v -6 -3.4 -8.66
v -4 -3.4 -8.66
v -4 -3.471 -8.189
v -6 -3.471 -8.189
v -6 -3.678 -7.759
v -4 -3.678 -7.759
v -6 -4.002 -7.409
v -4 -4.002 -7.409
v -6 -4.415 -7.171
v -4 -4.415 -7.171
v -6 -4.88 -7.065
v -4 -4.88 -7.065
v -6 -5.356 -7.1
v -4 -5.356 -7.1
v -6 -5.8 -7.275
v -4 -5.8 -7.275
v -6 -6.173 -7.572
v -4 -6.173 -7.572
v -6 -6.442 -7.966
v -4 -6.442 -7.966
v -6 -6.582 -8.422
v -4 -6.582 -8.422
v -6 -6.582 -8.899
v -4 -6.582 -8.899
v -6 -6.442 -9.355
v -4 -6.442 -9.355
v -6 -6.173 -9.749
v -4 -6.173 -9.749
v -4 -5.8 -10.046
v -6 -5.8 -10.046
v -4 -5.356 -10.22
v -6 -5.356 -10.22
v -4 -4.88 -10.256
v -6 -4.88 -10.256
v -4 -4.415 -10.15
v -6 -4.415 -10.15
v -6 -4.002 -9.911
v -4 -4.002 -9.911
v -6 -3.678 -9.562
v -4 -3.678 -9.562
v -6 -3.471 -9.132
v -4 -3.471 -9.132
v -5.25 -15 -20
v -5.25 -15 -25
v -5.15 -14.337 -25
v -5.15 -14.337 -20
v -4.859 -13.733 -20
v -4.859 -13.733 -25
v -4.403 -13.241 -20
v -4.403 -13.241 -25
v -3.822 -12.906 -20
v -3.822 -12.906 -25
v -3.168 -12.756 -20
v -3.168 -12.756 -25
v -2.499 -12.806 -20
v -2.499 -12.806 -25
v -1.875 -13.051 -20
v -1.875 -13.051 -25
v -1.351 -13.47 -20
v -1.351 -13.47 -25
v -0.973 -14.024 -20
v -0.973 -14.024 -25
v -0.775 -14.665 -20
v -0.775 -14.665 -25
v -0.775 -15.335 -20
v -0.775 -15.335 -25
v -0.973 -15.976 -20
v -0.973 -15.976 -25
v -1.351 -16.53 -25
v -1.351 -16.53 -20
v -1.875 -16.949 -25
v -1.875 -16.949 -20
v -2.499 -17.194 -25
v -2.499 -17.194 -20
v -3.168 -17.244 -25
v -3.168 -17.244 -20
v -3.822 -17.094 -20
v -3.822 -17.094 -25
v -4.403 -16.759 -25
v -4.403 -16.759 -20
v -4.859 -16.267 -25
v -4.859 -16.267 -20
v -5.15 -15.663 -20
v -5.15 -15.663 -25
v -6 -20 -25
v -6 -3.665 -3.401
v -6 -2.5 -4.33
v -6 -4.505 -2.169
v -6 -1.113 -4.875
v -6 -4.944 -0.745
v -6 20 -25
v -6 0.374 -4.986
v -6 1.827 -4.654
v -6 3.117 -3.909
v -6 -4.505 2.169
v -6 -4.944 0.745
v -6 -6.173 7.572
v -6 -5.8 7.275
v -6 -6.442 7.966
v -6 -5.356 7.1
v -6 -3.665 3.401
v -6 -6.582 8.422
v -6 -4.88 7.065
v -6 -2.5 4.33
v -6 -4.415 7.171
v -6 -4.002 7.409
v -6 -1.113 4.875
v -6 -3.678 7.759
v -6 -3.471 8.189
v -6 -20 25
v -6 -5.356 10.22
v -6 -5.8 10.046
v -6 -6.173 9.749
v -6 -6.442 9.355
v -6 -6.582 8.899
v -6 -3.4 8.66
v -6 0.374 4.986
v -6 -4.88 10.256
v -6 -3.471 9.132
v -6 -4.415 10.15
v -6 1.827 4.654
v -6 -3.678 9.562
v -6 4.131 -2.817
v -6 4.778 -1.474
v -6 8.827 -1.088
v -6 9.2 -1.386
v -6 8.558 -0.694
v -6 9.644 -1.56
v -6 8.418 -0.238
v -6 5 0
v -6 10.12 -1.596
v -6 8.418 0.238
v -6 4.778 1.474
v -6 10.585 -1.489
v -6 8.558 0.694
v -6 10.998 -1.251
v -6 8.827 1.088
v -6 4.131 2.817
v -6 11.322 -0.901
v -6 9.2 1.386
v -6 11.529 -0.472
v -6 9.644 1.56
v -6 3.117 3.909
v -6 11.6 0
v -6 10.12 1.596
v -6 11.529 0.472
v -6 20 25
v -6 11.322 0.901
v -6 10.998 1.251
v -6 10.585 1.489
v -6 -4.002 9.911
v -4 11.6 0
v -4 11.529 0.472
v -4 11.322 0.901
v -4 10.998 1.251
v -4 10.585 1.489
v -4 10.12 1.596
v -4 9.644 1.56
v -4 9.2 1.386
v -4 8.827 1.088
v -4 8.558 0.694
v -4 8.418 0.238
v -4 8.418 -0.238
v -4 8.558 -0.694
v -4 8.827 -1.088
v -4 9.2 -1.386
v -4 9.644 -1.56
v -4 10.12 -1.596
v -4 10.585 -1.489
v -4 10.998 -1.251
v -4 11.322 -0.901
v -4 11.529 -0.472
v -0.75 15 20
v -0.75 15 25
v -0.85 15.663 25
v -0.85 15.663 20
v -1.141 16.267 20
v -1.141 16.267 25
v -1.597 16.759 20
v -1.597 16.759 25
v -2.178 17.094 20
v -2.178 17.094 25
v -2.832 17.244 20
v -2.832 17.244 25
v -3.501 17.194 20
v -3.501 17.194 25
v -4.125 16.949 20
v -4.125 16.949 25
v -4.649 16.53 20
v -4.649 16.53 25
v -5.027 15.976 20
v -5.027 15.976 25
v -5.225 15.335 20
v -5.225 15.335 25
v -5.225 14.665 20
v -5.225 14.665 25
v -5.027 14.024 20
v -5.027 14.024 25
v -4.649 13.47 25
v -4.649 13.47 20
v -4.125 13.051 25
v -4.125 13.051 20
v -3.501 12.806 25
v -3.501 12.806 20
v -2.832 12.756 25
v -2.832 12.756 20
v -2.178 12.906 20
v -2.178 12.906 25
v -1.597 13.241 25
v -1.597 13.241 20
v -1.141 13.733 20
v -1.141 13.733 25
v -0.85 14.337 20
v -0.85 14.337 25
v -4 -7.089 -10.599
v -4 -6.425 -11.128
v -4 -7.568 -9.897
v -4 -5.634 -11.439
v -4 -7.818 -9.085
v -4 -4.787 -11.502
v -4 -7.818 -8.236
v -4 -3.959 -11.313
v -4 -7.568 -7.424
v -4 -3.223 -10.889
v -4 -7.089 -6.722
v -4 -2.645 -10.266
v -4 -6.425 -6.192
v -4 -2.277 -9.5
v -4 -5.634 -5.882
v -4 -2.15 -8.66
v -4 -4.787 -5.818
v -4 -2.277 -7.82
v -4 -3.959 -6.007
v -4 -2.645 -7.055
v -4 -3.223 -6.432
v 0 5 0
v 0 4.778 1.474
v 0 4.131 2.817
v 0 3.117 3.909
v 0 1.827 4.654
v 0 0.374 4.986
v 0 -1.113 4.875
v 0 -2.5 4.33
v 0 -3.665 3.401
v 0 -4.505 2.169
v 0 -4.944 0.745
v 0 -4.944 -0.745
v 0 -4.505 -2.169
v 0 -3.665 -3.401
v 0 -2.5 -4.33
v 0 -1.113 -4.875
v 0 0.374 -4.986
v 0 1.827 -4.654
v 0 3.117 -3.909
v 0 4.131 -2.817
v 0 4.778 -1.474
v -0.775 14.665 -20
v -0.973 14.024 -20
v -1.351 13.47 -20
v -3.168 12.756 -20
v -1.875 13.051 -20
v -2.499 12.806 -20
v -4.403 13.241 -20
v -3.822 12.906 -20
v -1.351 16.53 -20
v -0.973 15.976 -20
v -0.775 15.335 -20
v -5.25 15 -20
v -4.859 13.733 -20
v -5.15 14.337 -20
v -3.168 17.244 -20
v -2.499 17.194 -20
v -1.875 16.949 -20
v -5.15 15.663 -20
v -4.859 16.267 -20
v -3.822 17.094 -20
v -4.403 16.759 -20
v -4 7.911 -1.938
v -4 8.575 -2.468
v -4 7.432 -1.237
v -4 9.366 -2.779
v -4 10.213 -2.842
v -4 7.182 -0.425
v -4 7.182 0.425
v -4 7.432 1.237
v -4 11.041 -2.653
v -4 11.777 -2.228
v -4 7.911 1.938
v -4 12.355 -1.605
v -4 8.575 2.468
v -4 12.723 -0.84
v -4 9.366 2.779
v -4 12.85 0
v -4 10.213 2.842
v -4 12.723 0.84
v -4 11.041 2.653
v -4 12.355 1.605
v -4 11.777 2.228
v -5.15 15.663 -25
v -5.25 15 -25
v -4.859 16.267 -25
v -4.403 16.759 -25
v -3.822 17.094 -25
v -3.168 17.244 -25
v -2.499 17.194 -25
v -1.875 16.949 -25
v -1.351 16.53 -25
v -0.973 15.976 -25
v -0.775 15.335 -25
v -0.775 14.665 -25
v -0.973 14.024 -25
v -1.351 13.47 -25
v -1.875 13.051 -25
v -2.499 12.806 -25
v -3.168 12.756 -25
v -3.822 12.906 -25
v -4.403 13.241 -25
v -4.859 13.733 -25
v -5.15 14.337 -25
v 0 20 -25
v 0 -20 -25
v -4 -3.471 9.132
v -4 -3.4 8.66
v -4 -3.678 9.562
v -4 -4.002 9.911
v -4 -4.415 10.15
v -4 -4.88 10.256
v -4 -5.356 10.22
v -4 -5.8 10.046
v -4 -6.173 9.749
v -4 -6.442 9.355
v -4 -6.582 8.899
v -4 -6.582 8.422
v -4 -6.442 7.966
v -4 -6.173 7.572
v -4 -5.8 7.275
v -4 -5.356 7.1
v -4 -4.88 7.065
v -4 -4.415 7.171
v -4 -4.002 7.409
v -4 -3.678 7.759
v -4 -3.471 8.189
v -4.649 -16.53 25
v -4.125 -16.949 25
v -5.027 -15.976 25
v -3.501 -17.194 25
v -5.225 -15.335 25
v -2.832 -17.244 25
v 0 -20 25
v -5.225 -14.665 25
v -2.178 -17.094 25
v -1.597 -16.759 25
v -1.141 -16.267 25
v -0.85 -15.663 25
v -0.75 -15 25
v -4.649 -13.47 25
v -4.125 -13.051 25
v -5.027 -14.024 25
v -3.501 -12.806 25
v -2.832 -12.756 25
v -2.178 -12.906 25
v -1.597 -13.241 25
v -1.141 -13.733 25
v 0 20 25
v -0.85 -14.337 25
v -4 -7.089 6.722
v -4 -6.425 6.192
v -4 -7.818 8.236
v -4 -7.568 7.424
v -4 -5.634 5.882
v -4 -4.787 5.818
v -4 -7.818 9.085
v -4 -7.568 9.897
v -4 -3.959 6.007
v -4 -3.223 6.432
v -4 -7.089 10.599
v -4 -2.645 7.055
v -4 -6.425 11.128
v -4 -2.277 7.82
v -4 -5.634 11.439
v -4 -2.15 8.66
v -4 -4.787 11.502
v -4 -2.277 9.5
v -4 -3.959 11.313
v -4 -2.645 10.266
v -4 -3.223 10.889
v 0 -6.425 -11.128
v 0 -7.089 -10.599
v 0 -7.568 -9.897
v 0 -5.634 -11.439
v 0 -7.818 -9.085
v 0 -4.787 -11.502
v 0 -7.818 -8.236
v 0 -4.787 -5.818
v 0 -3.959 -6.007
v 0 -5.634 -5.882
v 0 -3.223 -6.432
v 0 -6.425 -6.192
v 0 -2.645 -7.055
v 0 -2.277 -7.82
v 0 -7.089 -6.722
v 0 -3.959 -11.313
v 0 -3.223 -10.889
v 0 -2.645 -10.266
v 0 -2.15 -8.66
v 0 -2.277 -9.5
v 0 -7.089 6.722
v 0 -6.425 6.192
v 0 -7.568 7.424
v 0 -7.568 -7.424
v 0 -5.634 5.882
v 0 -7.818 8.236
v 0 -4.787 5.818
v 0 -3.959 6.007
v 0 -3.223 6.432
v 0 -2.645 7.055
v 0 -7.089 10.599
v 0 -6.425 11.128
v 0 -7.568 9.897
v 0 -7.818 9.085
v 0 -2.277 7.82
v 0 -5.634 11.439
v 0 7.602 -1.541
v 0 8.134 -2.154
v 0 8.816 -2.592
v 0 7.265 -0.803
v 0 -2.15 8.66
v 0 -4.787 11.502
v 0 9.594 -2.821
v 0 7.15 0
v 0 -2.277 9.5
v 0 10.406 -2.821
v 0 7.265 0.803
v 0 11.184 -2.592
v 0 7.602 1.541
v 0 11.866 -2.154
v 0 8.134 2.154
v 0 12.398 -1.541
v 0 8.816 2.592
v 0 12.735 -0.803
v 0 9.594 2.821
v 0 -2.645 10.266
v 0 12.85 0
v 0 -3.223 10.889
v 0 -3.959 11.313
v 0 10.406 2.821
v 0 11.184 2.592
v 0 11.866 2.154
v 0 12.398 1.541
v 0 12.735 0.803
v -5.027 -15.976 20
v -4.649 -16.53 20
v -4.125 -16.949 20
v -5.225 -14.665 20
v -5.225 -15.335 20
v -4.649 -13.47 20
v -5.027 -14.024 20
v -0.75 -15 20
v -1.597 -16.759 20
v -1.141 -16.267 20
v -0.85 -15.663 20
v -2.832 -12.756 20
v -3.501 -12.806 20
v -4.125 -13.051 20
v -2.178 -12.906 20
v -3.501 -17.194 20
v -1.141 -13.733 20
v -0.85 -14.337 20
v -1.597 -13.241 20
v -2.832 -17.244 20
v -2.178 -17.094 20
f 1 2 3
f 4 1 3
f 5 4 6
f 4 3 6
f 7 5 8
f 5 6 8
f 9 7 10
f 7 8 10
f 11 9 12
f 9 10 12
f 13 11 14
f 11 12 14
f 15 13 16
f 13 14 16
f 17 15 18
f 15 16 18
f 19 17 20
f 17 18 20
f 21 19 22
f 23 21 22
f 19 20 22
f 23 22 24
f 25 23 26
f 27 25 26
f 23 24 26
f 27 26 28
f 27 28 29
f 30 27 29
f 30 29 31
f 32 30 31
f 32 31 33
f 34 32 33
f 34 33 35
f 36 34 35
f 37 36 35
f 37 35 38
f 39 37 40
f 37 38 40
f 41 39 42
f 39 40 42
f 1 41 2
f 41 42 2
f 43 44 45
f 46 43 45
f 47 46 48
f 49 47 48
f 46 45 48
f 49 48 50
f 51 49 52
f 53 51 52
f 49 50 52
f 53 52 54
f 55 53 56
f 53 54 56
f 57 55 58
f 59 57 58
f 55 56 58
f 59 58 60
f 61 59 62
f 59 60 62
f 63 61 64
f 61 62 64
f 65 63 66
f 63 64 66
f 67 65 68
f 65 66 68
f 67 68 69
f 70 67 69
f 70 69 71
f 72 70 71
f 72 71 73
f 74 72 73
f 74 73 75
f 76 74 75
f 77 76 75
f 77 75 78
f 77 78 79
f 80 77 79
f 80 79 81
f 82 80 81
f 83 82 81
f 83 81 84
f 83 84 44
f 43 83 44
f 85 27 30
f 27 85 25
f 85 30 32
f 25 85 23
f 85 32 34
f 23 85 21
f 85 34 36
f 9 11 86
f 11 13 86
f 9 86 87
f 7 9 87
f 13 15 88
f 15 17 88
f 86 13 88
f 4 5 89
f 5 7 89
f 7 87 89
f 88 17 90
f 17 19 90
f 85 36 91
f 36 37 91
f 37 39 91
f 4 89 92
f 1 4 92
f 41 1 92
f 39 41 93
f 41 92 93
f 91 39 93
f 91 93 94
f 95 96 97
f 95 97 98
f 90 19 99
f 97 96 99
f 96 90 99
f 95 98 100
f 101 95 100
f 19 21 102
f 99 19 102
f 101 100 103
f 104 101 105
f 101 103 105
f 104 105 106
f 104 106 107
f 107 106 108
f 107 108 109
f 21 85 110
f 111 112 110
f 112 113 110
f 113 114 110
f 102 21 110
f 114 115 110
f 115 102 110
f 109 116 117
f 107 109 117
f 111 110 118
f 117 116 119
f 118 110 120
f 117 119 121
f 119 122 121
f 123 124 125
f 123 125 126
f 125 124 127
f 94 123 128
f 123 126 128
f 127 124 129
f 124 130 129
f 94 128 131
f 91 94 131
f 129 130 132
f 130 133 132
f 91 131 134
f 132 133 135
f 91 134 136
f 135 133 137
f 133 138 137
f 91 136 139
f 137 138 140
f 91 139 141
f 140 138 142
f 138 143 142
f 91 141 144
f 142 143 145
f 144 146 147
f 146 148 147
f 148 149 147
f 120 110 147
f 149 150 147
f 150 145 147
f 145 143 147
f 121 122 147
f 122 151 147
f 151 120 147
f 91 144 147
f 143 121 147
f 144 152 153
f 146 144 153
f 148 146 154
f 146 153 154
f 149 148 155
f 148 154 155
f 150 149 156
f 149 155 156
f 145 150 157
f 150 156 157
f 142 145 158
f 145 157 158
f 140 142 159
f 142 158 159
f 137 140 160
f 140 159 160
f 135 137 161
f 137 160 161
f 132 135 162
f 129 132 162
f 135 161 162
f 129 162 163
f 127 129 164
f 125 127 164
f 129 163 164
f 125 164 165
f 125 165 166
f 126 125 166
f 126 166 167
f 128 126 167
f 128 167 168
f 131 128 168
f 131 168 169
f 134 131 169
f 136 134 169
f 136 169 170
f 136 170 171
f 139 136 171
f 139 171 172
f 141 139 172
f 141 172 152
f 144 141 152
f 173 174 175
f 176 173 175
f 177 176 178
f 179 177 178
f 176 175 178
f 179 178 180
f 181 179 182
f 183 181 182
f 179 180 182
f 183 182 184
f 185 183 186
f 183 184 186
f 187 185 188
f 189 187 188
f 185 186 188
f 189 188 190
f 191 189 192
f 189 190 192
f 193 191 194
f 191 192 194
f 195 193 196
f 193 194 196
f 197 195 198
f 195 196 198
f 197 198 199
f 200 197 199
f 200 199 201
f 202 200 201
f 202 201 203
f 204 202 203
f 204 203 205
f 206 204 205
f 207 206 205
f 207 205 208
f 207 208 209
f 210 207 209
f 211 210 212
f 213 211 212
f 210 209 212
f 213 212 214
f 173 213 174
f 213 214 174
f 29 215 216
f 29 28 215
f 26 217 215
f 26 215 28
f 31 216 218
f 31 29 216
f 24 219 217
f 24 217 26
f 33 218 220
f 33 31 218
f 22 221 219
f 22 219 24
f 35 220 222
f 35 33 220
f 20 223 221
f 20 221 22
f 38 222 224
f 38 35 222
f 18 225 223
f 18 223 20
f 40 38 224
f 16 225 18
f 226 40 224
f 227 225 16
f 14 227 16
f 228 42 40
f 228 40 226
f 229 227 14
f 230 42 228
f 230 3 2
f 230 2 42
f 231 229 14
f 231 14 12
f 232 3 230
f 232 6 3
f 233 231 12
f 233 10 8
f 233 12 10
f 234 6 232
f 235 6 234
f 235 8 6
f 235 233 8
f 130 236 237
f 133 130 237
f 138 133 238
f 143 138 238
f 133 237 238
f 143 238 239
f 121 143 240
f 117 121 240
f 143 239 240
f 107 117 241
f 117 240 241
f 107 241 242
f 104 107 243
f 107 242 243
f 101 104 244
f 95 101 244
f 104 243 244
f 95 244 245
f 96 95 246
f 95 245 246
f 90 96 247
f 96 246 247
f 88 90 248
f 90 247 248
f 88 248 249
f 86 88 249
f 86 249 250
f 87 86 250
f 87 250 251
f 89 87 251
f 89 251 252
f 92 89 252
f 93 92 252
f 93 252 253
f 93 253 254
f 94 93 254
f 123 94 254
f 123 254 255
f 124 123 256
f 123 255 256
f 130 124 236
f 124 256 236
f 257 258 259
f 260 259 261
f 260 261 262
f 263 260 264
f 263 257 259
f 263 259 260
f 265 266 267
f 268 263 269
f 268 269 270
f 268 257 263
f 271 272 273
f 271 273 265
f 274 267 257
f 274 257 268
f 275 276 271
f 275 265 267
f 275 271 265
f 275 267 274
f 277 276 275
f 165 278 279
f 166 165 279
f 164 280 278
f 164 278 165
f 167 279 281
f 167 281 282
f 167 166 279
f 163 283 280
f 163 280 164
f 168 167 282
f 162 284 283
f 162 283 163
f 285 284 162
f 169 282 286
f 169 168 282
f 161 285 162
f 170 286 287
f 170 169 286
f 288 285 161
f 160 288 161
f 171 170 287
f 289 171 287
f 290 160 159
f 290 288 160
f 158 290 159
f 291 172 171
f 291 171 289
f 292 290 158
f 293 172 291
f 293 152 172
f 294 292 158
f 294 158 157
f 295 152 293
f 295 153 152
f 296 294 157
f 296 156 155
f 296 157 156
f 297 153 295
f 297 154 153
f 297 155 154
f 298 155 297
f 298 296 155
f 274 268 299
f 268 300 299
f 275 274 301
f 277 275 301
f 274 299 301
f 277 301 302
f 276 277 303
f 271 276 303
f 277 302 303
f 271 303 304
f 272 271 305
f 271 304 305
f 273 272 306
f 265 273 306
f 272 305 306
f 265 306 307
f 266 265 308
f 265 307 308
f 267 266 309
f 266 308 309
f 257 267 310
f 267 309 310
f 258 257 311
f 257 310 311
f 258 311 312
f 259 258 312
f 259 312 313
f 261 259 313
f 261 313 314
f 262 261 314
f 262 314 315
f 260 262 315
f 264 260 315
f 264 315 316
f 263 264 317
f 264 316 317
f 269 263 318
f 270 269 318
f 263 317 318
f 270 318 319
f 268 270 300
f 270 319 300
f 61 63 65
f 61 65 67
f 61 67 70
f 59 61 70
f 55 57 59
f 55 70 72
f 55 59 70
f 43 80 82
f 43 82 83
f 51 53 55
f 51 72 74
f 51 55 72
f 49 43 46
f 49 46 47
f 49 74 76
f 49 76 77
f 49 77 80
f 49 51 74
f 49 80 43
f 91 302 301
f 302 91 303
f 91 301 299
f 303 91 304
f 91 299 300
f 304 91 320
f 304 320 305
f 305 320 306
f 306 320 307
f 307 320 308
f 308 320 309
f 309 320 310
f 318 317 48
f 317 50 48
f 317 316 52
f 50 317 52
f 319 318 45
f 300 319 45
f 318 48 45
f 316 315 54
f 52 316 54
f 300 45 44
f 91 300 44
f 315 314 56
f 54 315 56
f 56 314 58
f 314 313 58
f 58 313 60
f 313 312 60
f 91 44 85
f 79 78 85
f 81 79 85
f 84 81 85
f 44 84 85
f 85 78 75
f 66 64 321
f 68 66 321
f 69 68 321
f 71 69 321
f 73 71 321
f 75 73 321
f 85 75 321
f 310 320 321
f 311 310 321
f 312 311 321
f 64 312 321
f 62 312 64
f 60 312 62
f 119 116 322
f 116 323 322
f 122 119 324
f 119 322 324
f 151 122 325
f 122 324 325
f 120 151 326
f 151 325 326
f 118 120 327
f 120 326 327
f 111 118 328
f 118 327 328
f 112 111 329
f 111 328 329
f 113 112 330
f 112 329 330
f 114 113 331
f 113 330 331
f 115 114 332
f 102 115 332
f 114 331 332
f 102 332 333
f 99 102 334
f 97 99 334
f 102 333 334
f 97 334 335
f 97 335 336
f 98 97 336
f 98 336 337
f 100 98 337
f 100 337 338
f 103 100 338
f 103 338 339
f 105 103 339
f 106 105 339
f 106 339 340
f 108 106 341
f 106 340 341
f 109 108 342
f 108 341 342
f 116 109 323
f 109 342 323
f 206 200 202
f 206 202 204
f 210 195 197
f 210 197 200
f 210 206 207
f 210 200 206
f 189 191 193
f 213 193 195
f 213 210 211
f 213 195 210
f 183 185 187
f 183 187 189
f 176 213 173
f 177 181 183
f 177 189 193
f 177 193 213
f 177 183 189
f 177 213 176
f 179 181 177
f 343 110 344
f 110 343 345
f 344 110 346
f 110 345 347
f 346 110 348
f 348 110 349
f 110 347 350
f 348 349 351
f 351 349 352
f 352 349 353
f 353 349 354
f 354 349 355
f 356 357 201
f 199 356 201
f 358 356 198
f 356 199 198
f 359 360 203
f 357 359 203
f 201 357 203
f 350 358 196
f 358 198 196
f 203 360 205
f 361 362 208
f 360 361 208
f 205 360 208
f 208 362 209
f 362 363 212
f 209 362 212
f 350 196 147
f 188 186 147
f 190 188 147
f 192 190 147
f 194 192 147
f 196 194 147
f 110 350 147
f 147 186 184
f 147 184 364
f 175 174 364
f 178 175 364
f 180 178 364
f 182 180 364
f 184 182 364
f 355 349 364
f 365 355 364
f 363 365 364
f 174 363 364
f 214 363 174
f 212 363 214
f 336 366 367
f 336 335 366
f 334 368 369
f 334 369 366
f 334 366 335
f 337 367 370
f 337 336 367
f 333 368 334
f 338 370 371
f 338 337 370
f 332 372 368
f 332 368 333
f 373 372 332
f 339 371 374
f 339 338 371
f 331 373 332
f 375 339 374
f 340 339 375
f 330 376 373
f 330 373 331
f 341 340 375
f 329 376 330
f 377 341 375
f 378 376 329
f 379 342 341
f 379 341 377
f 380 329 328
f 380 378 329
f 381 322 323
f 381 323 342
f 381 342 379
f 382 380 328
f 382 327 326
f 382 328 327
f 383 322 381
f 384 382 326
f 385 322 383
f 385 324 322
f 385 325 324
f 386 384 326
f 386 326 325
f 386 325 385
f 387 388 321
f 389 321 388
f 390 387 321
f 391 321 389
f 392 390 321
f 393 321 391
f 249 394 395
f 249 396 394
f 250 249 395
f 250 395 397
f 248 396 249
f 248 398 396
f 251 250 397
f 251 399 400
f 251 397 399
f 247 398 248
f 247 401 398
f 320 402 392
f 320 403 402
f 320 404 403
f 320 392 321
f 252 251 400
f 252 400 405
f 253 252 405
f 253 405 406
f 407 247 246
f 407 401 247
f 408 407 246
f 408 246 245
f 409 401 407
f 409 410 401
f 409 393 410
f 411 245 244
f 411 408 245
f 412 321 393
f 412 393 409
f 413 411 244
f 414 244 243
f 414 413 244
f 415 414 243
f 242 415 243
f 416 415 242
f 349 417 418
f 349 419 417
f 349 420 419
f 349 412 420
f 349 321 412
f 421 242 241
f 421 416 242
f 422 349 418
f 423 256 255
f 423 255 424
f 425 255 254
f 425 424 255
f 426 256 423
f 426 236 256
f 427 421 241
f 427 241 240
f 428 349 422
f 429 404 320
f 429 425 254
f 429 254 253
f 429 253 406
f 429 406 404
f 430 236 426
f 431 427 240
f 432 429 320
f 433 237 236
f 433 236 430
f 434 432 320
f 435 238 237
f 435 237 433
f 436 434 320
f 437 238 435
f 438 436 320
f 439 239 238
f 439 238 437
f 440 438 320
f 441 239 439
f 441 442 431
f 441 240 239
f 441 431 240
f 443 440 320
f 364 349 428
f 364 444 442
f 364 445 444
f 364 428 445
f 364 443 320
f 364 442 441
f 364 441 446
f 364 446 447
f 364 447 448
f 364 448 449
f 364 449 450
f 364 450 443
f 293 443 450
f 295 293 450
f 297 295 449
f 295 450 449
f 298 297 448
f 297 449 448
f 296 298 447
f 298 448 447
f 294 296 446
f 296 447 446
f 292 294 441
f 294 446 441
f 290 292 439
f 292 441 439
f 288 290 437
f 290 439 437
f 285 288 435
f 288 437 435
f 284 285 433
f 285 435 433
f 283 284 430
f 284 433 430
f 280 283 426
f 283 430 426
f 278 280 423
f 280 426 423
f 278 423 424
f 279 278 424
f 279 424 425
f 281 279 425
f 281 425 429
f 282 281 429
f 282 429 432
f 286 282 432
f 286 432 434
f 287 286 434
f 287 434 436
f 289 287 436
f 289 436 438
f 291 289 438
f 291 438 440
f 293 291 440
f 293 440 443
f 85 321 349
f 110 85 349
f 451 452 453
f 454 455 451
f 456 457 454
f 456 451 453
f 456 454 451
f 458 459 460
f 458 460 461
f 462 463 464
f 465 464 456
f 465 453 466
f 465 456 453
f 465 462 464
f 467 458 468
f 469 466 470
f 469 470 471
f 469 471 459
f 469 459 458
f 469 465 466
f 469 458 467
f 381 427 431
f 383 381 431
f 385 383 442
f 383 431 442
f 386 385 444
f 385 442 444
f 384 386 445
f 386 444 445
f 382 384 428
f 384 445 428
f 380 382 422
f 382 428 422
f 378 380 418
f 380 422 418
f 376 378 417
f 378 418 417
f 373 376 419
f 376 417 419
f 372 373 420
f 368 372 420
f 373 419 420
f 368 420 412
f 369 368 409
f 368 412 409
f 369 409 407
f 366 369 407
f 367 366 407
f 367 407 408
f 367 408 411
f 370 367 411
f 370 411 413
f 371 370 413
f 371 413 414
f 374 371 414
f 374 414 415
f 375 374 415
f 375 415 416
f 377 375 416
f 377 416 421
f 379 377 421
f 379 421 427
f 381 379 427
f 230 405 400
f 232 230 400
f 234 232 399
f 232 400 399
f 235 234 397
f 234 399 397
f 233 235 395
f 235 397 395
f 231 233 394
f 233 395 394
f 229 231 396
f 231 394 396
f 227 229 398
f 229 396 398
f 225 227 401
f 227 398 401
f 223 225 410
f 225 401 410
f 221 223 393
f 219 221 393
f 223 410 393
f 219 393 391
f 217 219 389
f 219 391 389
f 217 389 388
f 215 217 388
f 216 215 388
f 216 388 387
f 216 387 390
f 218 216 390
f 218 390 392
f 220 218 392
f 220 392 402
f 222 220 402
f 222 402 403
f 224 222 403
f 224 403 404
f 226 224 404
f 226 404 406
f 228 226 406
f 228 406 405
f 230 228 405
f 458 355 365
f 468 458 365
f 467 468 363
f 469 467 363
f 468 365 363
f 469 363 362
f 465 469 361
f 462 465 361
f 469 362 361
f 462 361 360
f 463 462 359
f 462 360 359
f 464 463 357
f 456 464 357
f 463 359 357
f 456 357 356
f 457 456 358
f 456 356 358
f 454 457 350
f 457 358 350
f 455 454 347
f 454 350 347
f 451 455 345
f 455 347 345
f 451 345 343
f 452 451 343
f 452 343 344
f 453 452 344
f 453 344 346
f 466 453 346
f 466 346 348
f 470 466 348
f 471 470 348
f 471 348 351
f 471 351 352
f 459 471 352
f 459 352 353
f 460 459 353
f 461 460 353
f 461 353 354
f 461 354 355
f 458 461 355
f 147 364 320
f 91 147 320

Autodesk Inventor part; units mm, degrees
ref_plane "YZ Plane" through (0, 0, 0) normal (1, 0, 0) x (0, 1, 0)
ref_plane "XZ Plane" through (0, 0, 0) normal (0, 1, 0) x (-1, 0, 0)
ref_plane "XY Plane" through (0, 0, 0) normal (0, 0, 1) x (1, 0, 0)
sketch "スケッチ1" plane through (0, 0, 0) normal (1, 0, 0) x (0, 1, 0)
  line L0 (-20, -25) -> (-20, 25)
  line L1 (-20, 25) -> (20, 25)
  line L2 (20, 25) -> (20, -25)
  line L3 (20, -25) -> (-20, -25)
  line L4 (-20, -25) -> (20, 25) construction
  line L5 (-20, 25) -> (20, -25) construction
  circle A0 centre (0, 0) radius 5
  circle A1 centre (10, 0) radius 1.6
  line L6 (0, 0) -> (18.1986, 0)
  circle A2 centre (10, 0) radius 2.85
  circle A3 centre (-5, 8.6603) radius 2.85
  circle A4 centre (-5, 8.6603) radius 1.6
  circle A5 centre (-5, -8.6603) radius 2.85
  circle A6 centre (-5, -8.6603) radius 1.6
  point P0 (0, 0)
  dimension "d0" = 40
  dimension "d1" = 50
  dimension "d8" = 10
  dimension "d9" = 10
  dimension "d10" = 3.2
  dimension "d11" = 5.7
  dimension "d14" = 360
extrude "押し出し1" add sketch "スケッチ1" against normal blind 6 contours L0 L1 L2 L3 | A0 | A2 L6 A1 | L6 A1 A2 | L6 A1 | A1 L6 | A3 | A4 | A5 | A6
extrude "押し出し2" cut sketch "スケッチ1" against normal blind 6 contours A0 | L6 A1 | A1 L6 | A4 | A6
extrude "押し出し3" cut sketch "スケッチ1" against normal blind 4 contours A2 L6 A1 | L6 A1 A2 | A3 | A5
sketch "スケッチ2" plane through (0, -20, 25) normal (0, 0, 1) x (1, 0, 0)
  circle A0 centre (-3, 5) radius 2.25
  circle A1 centre (-3, 35) radius 2.25
  line L0 (-6, 0) -> (-6, 40) projected
  line L1 (0, 0) -> (-6, 0) projected
  line L2 (0, 40) -> (-6, 40) projected
  point P0 (0, 20)
  dimension "d20" = 3
  dimension "d21" = 3
  dimension "d22" = 4.5
  dimension "d23" = 4.5
  dimension "d24" = 5
  dimension "d25" = 5
extrude "押し出し4" cut sketch "スケッチ2" against normal blind 5
sketch "スケッチ3" plane through (0, -20, -25) normal (0, 0, -1) x (-1, 0, 0)
  circle A0 centre (3, 5) radius 2.25 projected
  circle A1 centre (3, 35) radius 2.25 projected
  circle A2 centre (3, 5) radius 2.25 projected
  circle A3 centre (3, 5) radius 2.25
  circle A4 centre (3, 35) radius 2.25
  point P0 (0, 20)
extrude "押し出し5" cut sketch "スケッチ3" against normal blind 5
properties part number "connect-wrist"
